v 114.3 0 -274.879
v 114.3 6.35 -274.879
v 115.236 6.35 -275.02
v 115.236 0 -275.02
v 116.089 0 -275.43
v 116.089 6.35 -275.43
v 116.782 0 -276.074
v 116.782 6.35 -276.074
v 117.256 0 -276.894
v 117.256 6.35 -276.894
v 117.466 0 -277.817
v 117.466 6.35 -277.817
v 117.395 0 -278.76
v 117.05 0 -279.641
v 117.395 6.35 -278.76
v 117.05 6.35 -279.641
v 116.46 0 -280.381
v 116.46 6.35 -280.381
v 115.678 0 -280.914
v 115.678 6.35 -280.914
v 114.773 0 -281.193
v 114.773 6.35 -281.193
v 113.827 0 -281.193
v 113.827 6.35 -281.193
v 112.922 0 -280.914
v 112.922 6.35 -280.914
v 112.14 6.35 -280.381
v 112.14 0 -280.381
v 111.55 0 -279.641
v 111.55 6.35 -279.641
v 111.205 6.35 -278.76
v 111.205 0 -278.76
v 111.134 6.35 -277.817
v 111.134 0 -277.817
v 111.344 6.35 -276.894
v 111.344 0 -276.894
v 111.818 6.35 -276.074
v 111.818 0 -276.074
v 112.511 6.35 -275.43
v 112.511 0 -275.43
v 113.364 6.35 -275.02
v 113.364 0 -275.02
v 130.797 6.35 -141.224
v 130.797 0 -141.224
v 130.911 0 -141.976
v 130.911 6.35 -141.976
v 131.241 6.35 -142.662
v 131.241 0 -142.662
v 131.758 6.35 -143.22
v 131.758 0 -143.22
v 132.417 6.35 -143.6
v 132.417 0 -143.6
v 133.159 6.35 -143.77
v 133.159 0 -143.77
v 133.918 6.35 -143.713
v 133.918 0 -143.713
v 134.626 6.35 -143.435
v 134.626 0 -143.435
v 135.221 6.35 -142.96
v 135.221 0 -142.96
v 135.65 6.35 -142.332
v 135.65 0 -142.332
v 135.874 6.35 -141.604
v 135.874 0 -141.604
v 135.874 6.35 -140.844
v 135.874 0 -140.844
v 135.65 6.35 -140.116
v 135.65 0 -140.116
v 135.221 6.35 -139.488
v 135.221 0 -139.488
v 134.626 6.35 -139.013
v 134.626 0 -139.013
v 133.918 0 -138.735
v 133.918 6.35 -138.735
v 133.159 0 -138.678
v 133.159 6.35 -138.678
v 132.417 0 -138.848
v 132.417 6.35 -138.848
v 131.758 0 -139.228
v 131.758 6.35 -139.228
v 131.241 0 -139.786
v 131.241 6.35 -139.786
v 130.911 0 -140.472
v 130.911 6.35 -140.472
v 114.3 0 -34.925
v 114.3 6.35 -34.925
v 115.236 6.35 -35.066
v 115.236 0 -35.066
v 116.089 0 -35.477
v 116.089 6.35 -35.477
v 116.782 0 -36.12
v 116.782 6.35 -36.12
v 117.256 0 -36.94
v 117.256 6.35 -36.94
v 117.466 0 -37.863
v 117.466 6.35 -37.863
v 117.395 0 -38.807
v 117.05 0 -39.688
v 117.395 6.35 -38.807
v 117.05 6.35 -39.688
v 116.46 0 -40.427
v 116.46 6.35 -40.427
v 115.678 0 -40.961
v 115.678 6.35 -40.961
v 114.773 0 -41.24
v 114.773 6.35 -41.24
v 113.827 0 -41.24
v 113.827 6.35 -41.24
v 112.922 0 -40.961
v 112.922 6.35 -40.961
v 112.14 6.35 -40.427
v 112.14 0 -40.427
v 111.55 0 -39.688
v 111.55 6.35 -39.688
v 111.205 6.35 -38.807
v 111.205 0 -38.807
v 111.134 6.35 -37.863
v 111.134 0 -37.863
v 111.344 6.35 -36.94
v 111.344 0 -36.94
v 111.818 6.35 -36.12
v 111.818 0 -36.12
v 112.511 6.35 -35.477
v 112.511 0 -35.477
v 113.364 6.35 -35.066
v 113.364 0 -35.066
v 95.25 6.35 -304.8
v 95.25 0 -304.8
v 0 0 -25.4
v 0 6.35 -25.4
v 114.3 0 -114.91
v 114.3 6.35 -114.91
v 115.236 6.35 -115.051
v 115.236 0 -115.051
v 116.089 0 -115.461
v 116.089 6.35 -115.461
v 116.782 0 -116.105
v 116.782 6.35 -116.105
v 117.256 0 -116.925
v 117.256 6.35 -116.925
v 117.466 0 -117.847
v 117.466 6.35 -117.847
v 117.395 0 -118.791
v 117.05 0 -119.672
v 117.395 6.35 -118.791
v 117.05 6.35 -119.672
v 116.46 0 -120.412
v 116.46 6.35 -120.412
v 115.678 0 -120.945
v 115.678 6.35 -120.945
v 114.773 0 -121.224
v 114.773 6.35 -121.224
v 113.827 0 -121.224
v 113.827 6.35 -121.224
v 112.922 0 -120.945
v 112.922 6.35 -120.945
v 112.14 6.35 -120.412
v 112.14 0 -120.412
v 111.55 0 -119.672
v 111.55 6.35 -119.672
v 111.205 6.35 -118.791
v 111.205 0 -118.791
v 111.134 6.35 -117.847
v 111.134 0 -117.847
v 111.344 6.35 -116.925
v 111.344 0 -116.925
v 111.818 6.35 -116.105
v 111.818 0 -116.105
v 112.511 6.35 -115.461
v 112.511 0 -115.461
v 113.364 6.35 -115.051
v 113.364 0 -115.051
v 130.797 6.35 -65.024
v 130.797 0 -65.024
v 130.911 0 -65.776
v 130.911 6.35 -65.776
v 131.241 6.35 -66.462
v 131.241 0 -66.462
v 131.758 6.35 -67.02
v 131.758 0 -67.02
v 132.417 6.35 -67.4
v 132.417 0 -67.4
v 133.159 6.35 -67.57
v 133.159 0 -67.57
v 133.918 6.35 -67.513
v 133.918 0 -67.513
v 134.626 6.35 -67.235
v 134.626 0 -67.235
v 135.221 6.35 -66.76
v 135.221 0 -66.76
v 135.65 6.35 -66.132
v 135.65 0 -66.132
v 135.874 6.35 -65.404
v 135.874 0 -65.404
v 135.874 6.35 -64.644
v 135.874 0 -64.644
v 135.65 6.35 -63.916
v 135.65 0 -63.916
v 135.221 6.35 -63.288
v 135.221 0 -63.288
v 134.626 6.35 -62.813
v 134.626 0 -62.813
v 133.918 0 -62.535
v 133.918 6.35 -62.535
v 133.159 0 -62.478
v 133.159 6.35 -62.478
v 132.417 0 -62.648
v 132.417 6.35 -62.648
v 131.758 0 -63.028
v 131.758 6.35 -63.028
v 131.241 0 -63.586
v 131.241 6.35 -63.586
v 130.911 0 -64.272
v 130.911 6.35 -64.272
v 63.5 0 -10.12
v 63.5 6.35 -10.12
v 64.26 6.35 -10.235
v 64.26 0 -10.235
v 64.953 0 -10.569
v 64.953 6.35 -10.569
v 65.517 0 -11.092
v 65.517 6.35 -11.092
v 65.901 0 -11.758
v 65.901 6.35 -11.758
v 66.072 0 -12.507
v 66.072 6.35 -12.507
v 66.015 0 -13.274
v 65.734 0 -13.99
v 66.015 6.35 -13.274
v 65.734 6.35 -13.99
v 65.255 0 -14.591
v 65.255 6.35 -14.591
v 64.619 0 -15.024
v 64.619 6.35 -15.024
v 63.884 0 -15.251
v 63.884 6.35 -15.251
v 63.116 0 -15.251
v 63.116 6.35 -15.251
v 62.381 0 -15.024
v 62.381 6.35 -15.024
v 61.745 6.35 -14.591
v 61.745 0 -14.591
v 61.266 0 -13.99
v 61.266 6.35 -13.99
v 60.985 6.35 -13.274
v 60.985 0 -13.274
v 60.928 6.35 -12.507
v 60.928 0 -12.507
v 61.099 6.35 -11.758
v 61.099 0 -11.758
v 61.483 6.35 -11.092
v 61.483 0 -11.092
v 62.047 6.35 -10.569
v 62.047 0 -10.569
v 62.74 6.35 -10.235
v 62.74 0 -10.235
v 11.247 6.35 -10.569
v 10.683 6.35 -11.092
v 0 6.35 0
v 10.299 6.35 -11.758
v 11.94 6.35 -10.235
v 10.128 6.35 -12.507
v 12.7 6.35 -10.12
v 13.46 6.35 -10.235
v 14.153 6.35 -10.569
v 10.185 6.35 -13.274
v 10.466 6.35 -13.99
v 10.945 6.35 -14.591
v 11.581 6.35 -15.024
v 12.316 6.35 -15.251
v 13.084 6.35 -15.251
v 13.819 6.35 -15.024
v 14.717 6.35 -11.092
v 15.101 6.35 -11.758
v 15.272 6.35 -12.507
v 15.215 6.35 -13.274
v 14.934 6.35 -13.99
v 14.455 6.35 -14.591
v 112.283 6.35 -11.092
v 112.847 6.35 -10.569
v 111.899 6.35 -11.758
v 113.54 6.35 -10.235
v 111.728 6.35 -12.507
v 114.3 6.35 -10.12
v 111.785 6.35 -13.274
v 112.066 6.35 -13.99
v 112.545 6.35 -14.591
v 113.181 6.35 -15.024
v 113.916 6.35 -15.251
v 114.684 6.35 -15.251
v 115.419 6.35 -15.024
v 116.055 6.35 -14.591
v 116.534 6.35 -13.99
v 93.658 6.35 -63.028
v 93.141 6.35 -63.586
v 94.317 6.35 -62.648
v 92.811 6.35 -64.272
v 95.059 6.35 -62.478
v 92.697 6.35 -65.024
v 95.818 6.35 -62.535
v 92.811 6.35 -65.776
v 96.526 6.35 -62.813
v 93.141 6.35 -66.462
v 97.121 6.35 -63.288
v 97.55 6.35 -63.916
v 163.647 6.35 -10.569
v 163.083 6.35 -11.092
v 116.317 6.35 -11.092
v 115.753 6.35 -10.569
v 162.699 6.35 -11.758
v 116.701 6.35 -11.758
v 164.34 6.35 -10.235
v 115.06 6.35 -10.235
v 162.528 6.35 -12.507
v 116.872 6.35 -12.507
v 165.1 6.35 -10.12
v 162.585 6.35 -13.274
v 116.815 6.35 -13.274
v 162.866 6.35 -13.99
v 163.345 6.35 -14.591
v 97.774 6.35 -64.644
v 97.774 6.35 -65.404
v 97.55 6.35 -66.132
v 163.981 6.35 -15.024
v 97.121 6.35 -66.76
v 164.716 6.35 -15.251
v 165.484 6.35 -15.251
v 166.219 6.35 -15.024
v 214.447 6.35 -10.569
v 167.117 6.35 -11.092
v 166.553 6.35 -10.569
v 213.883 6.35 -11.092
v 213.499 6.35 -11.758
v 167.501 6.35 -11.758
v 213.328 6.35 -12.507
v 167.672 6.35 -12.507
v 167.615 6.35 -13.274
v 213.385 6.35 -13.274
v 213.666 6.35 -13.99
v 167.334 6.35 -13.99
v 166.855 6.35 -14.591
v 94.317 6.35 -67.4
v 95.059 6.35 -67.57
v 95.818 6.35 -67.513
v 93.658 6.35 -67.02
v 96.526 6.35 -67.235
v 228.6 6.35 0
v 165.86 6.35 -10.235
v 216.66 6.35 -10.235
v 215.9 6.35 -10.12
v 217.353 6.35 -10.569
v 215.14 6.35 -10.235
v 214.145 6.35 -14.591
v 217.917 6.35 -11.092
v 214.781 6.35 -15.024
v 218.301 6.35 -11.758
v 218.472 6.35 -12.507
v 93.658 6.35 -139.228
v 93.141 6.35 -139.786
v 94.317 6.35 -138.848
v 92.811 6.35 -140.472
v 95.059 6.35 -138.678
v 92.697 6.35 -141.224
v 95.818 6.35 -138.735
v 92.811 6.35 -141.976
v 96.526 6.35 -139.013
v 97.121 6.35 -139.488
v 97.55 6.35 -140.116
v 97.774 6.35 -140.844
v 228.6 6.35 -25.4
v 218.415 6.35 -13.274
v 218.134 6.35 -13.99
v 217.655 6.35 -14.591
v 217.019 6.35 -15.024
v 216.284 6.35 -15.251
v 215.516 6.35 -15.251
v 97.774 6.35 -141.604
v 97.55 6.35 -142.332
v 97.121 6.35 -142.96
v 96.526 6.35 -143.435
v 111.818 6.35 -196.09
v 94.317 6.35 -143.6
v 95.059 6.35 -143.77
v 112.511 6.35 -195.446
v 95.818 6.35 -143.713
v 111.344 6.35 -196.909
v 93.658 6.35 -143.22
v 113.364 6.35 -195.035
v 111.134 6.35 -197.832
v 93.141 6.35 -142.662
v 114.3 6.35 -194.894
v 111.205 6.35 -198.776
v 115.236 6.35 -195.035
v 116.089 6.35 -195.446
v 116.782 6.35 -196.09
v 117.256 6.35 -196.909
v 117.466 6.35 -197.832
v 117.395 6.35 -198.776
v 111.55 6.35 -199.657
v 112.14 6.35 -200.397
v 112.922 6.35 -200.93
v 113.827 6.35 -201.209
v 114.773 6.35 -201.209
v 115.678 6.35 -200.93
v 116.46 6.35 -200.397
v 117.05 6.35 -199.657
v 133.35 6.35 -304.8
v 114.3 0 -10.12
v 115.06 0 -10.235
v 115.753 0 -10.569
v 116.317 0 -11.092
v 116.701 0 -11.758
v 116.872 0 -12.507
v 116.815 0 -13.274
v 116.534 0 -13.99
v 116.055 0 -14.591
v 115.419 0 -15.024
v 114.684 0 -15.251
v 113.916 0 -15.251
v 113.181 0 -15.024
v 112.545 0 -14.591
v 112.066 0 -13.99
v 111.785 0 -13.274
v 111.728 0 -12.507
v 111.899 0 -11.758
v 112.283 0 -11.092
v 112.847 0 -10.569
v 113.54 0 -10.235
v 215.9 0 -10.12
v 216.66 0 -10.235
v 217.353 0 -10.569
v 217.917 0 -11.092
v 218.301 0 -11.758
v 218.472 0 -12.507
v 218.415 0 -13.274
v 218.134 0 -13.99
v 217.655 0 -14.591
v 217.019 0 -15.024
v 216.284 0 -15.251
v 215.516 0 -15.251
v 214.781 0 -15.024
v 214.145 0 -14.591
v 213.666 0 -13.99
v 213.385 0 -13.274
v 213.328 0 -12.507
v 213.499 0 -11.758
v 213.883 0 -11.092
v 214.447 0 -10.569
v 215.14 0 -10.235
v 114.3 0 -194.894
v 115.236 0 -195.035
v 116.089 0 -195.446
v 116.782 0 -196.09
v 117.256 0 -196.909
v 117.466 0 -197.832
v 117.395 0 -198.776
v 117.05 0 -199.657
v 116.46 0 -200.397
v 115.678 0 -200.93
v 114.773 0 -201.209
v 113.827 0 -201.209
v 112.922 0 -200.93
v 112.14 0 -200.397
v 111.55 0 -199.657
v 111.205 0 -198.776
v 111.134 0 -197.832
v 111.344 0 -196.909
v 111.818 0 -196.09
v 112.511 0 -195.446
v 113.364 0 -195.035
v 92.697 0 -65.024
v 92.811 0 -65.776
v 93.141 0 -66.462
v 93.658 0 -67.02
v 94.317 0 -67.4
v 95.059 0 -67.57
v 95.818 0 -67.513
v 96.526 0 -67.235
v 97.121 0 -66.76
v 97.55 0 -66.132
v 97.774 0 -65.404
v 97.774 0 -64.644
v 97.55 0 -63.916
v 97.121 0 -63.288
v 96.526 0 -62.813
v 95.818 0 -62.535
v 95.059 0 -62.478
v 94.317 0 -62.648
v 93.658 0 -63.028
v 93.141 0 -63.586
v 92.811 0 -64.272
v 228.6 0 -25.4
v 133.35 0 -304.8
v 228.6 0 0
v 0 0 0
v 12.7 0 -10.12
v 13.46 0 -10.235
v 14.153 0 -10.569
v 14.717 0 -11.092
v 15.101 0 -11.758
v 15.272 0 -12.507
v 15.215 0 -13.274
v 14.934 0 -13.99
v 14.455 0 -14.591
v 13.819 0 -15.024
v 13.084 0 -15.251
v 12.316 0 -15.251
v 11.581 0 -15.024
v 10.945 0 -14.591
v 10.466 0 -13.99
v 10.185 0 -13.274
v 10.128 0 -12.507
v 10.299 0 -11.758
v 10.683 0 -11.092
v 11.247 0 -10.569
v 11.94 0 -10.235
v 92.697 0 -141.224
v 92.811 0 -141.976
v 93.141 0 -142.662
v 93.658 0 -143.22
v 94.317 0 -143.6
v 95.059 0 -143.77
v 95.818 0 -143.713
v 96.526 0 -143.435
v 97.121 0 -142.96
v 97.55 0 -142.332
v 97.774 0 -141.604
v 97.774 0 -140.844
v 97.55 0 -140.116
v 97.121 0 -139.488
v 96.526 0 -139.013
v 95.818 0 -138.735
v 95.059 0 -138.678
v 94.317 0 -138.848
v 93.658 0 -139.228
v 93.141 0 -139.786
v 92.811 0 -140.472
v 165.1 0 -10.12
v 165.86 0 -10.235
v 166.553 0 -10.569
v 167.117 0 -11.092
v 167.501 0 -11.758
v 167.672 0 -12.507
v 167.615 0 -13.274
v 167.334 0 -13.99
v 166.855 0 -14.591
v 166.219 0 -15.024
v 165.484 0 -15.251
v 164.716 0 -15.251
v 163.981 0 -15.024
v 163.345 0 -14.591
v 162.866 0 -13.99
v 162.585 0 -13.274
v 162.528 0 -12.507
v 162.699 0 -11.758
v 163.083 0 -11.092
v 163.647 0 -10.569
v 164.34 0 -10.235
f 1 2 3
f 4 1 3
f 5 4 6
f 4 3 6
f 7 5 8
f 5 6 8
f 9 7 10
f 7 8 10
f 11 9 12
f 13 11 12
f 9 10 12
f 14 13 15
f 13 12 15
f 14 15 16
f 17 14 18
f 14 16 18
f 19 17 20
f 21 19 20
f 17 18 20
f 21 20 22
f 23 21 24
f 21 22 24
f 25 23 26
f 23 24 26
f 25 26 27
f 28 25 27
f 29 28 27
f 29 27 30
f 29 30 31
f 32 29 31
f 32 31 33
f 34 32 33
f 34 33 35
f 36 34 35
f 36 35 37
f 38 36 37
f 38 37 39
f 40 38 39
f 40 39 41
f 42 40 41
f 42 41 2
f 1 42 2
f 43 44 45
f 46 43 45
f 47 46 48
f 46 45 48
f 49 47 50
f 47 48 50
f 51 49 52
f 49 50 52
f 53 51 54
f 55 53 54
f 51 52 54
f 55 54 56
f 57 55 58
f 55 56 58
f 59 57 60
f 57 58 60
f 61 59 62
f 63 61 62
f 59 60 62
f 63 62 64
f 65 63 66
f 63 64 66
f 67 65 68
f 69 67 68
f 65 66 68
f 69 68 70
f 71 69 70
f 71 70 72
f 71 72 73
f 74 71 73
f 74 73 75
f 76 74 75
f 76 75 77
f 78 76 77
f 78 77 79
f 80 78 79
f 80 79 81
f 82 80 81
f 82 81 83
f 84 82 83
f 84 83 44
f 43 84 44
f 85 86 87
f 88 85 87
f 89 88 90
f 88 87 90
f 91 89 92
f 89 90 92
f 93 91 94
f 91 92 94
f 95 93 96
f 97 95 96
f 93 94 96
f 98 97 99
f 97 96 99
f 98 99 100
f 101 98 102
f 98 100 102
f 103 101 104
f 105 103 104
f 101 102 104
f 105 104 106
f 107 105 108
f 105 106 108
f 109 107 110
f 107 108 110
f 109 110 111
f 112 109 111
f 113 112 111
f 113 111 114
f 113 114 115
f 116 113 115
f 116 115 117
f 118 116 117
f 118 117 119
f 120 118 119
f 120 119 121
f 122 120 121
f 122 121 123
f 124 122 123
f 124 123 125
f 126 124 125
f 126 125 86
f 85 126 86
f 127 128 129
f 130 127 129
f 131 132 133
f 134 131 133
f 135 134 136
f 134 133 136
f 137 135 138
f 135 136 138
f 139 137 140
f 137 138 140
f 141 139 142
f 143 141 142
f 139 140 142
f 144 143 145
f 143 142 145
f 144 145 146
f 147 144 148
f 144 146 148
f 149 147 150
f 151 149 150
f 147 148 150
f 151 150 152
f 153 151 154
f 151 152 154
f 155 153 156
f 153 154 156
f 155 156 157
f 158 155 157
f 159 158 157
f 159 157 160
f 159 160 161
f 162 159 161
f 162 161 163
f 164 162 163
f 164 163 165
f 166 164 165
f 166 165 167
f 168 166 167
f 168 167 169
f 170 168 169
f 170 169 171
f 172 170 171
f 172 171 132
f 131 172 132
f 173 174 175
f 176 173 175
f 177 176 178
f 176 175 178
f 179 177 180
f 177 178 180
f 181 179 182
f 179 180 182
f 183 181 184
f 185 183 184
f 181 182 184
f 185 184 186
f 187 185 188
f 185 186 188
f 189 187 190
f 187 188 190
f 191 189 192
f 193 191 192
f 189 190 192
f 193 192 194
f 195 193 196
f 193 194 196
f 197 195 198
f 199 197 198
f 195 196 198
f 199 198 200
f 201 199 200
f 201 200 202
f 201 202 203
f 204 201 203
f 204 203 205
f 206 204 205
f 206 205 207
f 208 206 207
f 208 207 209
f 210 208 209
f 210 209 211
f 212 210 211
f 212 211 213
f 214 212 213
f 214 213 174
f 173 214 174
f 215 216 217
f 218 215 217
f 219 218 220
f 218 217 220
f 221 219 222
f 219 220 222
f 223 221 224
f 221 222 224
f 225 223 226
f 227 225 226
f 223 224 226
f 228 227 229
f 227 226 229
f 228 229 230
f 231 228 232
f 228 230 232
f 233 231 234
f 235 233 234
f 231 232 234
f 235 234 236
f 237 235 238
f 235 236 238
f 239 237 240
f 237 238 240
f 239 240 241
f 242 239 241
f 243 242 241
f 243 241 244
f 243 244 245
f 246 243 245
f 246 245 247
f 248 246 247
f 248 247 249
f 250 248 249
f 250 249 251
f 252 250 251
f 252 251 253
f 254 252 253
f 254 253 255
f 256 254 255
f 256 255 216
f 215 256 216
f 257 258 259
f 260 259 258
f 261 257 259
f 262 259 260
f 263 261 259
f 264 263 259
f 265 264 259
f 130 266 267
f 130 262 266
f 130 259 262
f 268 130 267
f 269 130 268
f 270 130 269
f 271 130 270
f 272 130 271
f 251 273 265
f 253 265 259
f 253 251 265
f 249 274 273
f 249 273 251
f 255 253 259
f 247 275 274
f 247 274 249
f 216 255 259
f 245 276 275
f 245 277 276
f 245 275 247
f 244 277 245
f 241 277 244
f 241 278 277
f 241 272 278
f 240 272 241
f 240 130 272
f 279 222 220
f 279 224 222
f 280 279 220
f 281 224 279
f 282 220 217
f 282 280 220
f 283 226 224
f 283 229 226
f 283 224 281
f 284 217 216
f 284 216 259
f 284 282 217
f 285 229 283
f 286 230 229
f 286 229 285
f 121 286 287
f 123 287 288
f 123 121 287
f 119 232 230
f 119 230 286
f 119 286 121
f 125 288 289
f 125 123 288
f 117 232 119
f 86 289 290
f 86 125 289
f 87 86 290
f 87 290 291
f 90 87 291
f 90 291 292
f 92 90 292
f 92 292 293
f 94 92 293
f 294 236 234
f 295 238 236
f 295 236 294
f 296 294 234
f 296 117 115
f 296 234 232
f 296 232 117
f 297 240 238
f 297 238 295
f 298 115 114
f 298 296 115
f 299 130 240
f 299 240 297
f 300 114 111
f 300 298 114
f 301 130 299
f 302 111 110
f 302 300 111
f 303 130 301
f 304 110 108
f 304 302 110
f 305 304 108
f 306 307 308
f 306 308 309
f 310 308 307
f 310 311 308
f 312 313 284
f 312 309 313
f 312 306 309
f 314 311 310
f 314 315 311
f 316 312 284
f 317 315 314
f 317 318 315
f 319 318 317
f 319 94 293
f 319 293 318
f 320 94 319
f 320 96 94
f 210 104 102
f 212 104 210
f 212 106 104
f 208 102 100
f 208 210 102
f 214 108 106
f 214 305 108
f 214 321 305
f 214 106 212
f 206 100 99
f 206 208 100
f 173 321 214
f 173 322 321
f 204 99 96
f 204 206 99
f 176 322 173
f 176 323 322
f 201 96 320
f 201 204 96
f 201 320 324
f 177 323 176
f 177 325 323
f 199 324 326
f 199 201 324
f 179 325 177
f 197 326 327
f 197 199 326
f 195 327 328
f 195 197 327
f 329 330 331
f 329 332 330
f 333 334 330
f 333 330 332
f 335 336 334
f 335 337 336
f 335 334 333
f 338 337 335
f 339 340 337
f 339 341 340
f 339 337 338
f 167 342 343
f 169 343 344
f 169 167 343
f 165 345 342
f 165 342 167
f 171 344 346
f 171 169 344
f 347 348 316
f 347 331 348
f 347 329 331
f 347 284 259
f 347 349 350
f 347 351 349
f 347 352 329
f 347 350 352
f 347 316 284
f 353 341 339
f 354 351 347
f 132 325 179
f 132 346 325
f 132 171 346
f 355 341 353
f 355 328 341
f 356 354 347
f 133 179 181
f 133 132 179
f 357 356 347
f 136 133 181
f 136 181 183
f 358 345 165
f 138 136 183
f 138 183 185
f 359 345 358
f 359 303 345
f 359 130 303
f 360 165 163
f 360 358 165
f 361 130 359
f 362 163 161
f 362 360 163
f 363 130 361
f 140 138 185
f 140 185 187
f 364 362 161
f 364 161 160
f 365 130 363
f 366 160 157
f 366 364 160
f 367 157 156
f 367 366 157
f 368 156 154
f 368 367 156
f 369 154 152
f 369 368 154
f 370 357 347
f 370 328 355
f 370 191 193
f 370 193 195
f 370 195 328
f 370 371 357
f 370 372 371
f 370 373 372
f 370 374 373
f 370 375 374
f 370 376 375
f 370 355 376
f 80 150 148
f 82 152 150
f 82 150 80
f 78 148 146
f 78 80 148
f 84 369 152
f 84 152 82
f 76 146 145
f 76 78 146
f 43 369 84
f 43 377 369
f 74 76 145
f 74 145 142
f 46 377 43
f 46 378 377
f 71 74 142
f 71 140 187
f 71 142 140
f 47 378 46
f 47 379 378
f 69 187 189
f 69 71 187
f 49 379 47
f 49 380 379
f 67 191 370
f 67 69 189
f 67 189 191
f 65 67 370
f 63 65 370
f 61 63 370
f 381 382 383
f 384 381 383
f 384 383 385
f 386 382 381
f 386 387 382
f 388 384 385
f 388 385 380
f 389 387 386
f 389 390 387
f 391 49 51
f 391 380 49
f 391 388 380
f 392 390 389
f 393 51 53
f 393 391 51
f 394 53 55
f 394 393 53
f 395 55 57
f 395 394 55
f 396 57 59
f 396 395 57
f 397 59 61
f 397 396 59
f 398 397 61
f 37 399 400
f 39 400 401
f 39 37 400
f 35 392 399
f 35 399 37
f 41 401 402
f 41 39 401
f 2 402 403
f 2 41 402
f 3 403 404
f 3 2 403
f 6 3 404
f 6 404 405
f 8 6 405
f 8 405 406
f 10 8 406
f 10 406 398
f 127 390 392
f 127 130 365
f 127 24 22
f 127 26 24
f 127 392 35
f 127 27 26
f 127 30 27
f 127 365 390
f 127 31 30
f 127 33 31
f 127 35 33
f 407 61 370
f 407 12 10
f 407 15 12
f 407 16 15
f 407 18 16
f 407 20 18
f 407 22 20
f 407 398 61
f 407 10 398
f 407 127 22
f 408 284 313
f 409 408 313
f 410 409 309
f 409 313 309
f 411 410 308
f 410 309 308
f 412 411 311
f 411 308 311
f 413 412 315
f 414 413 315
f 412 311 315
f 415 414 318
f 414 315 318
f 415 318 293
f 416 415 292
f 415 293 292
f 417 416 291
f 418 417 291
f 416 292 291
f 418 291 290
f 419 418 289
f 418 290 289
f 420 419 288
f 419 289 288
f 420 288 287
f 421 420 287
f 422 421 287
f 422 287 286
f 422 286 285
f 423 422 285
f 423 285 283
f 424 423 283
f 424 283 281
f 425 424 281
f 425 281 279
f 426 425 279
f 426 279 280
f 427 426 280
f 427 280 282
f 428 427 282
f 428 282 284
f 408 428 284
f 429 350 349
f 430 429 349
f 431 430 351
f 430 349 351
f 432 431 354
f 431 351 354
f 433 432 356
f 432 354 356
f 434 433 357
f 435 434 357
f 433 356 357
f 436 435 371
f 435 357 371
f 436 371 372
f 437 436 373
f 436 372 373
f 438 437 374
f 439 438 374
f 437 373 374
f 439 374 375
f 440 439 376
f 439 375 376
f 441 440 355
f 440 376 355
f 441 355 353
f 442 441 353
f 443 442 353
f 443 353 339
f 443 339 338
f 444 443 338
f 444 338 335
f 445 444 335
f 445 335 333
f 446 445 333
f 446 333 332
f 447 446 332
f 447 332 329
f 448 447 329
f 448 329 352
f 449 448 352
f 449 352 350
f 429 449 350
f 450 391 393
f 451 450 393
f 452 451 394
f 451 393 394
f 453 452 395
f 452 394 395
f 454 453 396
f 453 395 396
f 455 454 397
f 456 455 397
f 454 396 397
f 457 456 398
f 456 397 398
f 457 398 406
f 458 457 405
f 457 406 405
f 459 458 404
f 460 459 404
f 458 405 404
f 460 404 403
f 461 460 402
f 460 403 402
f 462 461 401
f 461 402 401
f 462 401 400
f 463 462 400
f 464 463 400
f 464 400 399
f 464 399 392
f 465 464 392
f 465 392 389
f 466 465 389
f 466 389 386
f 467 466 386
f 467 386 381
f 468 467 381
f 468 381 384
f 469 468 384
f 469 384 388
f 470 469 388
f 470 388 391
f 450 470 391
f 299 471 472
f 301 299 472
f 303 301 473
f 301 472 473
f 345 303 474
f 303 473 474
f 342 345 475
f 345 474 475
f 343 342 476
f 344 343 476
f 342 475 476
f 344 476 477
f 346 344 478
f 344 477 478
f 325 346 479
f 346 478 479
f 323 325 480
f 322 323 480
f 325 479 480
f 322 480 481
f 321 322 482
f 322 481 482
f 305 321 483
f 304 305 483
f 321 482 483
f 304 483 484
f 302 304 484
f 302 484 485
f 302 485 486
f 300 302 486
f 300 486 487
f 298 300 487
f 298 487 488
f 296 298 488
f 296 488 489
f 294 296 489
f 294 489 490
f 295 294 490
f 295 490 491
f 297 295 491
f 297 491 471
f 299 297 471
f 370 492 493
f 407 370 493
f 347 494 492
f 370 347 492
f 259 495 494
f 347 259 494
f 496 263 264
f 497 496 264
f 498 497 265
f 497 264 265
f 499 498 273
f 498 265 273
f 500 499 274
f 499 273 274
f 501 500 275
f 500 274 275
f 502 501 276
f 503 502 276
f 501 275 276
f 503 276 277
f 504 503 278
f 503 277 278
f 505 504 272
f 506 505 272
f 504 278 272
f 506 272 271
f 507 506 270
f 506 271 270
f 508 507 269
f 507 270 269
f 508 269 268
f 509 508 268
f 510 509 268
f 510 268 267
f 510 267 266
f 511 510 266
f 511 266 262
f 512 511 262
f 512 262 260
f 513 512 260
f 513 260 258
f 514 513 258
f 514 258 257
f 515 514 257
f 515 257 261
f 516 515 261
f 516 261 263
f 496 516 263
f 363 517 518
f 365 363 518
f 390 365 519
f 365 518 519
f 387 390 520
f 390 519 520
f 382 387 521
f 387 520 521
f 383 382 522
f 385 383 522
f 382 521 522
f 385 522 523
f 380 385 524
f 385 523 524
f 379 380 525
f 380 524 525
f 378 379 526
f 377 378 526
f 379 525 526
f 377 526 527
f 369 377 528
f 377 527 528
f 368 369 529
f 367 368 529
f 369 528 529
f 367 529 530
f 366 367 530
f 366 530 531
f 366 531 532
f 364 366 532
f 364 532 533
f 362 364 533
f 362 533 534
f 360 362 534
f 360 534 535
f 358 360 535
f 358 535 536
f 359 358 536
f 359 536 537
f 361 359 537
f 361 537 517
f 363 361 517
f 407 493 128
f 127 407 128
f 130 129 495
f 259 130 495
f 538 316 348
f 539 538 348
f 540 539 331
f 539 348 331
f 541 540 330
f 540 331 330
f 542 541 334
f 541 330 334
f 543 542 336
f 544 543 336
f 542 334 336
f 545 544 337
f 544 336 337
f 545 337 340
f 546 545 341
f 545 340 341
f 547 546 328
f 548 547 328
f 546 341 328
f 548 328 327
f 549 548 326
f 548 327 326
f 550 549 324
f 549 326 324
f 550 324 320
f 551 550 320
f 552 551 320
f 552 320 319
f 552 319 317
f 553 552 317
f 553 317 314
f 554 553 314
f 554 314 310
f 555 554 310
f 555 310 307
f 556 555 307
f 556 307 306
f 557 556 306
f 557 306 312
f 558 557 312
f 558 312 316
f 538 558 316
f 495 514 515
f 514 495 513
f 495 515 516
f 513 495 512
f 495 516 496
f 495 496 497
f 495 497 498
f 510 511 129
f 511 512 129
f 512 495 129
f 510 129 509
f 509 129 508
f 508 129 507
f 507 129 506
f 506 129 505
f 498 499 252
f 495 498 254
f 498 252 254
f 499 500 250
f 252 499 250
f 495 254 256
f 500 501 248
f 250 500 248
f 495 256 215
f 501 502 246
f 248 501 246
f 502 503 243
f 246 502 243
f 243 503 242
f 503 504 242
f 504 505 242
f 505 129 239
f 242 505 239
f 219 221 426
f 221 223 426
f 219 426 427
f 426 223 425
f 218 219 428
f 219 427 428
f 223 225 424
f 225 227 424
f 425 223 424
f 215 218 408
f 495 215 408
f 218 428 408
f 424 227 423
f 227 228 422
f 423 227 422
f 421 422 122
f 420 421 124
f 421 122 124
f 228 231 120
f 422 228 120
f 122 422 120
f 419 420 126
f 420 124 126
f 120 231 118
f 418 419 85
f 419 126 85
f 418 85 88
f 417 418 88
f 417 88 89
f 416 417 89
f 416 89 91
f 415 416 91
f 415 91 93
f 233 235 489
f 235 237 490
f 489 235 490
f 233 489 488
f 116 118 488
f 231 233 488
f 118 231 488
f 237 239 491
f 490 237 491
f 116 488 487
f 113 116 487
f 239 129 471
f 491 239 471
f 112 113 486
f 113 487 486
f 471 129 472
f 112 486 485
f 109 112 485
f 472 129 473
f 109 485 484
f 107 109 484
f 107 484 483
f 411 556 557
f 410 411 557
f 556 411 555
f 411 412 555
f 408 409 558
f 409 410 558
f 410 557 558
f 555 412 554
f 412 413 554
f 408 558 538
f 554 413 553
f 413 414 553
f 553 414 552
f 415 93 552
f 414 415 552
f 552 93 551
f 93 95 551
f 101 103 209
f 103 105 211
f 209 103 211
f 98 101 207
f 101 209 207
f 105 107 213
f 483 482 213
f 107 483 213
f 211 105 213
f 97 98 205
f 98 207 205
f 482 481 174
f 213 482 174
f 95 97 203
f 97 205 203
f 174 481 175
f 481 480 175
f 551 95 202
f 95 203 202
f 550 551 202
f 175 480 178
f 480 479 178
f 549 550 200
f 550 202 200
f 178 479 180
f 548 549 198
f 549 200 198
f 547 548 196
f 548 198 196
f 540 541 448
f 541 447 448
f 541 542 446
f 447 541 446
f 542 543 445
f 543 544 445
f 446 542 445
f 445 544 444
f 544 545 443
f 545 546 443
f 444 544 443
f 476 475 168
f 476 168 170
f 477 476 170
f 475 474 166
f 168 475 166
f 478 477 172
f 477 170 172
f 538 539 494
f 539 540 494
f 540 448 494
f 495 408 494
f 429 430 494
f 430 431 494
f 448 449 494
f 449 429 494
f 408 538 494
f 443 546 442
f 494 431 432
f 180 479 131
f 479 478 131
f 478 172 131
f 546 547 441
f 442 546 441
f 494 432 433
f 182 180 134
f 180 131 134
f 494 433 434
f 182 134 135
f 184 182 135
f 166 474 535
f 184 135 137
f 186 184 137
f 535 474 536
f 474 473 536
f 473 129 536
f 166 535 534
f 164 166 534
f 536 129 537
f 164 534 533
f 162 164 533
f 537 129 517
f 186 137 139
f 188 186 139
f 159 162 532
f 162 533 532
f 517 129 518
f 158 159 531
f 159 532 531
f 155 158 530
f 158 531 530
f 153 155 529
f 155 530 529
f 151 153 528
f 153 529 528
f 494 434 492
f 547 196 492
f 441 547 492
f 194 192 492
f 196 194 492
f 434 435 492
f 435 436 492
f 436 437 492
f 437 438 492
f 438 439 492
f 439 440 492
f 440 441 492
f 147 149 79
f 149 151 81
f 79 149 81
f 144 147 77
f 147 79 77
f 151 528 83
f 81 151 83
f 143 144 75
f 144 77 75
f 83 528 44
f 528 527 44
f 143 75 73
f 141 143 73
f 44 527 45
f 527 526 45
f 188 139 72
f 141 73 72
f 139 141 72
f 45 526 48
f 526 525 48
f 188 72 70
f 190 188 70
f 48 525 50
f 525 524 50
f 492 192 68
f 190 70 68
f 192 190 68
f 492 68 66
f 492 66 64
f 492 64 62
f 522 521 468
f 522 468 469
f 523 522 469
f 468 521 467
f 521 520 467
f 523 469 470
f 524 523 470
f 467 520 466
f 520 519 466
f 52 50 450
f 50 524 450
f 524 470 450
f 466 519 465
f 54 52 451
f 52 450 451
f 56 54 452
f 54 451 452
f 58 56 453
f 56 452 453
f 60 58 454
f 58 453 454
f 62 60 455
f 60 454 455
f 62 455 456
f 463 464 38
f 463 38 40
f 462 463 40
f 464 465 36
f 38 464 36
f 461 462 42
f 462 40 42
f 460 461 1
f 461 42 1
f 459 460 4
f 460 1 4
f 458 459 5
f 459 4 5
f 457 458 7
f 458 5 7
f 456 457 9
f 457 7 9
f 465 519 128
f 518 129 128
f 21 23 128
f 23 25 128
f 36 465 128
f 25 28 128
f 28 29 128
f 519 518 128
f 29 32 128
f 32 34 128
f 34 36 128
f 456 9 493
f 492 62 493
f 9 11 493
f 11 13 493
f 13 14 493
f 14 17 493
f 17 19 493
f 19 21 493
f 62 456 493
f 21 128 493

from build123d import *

# Parameters (mm, degrees)
BOSS_EXTRUDE1_DEPTH         = 6.35
SKETCH2_R                   = 2.5796875
SKETCH2_R_2                 = 3.175
CUT_EXTRUDE1_DEPTH          = 382.052912992
SKETCH3_R                   = 1.905
CUT_EXTRUDE2_DEPTH          = 382.052912992
F_1_4_20_TAPPED_HOLE1_D     = 5.1054
F_1_4_20_TAPPED_HOLE1_DEPTH = 16.51
F_1_4_20_TAPPED_HOLE1_TIP   = 1.533816902


with BuildPart() as part:
    # Sketch1 → Boss-Extrude1 (new body)
    with BuildSketch(Plane(origin=(0, 0, 0), x_dir=(1, 0, 0), z_dir=(0, 1, 0))):
        Polygon((0, 0), (228.6, 0), (228.6, 25.4), (133.35, 304.8), (95.25, 304.8), (0, 25.4), align=None)
    extrude(amount=BOSS_EXTRUDE1_DEPTH)

    # Sketch2 → Cut-Extrude1 (cut, through all)
    with BuildSketch(Plane(origin=(0, 6.35, 0), x_dir=(1, 0, 0), z_dir=(0, 1, 0))):
        with Locations(Location((165.1, 12.7, 0), (0, 0, 270))):
            Circle(SKETCH2_R)
        with Locations(Location((114.3, 12.7, 0), (0, 0, 270))):
            Circle(SKETCH2_R)
        with Locations(Location((63.5, 12.7, 0), (0, 0, 270))):
            Circle(SKETCH2_R)
        with Locations(Location((114.3, 38.1, 0), (0, 0, 270))):
            Circle(SKETCH2_R_2)
        with Locations(Location((114.3, 118.0846, 0), (0, 0, 270))):
            Circle(SKETCH2_R_2)
        with Locations(Location((114.3, 198.0692, 0), (0, 0, 270))):
            Circle(SKETCH2_R_2)
        with Locations(Location((114.3, 278.0538, 0), (0, 0, 270))):
            Circle(SKETCH2_R_2)
        with Locations(Location((12.7, 12.7, 0), (0, 0, 270))):
            Circle(SKETCH2_R)
        with Locations(Location((215.9, 12.7, 0), (0, 0, 270))):
            Circle(SKETCH2_R)
    extrude(amount=-CUT_EXTRUDE1_DEPTH, mode=Mode.SUBTRACT)

    # Sketch3 → Cut-Extrude2 (cut, through all)
    with BuildSketch(Plane(origin=(0, 6.35, 0), x_dir=(1, 0, 0), z_dir=(0, 1, 0))):
        with Locations(Location((133.35, 65.024, 0), (0, 0, 270))):
            Circle(SKETCH3_R)
        with Locations(Location((95.25, 65.024, 0), (0, 0, 270))):
            Circle(SKETCH3_R)
        with Locations(Location((133.35, 141.224, 0), (0, 0, 270))):
            Circle(SKETCH3_R)
        with Locations(Location((95.25, 141.224, 0), (0, 0, 270))):
            Circle(SKETCH3_R)
    extrude(amount=-CUT_EXTRUDE2_DEPTH, mode=Mode.SUBTRACT)

    # 1/4-20 Tapped Hole1
    with Locations(Plane(origin=(0, 6.35, 0), x_dir=(1, 0, 0), z_dir=(0, 1, 0))):
        with Locations((95.25, 141.224), (133.35, 141.224), (133.35, 65.024), (95.25, 65.024)):
            Hole(F_1_4_20_TAPPED_HOLE1_D / 2, depth=F_1_4_20_TAPPED_HOLE1_DEPTH)
            with Locations((0, 0, -(F_1_4_20_TAPPED_HOLE1_DEPTH + F_1_4_20_TAPPED_HOLE1_TIP / 2))):  # 118° drill point
                Cone(0, F_1_4_20_TAPPED_HOLE1_D / 2, F_1_4_20_TAPPED_HOLE1_TIP, mode=Mode.SUBTRACT)


solid = part.part
